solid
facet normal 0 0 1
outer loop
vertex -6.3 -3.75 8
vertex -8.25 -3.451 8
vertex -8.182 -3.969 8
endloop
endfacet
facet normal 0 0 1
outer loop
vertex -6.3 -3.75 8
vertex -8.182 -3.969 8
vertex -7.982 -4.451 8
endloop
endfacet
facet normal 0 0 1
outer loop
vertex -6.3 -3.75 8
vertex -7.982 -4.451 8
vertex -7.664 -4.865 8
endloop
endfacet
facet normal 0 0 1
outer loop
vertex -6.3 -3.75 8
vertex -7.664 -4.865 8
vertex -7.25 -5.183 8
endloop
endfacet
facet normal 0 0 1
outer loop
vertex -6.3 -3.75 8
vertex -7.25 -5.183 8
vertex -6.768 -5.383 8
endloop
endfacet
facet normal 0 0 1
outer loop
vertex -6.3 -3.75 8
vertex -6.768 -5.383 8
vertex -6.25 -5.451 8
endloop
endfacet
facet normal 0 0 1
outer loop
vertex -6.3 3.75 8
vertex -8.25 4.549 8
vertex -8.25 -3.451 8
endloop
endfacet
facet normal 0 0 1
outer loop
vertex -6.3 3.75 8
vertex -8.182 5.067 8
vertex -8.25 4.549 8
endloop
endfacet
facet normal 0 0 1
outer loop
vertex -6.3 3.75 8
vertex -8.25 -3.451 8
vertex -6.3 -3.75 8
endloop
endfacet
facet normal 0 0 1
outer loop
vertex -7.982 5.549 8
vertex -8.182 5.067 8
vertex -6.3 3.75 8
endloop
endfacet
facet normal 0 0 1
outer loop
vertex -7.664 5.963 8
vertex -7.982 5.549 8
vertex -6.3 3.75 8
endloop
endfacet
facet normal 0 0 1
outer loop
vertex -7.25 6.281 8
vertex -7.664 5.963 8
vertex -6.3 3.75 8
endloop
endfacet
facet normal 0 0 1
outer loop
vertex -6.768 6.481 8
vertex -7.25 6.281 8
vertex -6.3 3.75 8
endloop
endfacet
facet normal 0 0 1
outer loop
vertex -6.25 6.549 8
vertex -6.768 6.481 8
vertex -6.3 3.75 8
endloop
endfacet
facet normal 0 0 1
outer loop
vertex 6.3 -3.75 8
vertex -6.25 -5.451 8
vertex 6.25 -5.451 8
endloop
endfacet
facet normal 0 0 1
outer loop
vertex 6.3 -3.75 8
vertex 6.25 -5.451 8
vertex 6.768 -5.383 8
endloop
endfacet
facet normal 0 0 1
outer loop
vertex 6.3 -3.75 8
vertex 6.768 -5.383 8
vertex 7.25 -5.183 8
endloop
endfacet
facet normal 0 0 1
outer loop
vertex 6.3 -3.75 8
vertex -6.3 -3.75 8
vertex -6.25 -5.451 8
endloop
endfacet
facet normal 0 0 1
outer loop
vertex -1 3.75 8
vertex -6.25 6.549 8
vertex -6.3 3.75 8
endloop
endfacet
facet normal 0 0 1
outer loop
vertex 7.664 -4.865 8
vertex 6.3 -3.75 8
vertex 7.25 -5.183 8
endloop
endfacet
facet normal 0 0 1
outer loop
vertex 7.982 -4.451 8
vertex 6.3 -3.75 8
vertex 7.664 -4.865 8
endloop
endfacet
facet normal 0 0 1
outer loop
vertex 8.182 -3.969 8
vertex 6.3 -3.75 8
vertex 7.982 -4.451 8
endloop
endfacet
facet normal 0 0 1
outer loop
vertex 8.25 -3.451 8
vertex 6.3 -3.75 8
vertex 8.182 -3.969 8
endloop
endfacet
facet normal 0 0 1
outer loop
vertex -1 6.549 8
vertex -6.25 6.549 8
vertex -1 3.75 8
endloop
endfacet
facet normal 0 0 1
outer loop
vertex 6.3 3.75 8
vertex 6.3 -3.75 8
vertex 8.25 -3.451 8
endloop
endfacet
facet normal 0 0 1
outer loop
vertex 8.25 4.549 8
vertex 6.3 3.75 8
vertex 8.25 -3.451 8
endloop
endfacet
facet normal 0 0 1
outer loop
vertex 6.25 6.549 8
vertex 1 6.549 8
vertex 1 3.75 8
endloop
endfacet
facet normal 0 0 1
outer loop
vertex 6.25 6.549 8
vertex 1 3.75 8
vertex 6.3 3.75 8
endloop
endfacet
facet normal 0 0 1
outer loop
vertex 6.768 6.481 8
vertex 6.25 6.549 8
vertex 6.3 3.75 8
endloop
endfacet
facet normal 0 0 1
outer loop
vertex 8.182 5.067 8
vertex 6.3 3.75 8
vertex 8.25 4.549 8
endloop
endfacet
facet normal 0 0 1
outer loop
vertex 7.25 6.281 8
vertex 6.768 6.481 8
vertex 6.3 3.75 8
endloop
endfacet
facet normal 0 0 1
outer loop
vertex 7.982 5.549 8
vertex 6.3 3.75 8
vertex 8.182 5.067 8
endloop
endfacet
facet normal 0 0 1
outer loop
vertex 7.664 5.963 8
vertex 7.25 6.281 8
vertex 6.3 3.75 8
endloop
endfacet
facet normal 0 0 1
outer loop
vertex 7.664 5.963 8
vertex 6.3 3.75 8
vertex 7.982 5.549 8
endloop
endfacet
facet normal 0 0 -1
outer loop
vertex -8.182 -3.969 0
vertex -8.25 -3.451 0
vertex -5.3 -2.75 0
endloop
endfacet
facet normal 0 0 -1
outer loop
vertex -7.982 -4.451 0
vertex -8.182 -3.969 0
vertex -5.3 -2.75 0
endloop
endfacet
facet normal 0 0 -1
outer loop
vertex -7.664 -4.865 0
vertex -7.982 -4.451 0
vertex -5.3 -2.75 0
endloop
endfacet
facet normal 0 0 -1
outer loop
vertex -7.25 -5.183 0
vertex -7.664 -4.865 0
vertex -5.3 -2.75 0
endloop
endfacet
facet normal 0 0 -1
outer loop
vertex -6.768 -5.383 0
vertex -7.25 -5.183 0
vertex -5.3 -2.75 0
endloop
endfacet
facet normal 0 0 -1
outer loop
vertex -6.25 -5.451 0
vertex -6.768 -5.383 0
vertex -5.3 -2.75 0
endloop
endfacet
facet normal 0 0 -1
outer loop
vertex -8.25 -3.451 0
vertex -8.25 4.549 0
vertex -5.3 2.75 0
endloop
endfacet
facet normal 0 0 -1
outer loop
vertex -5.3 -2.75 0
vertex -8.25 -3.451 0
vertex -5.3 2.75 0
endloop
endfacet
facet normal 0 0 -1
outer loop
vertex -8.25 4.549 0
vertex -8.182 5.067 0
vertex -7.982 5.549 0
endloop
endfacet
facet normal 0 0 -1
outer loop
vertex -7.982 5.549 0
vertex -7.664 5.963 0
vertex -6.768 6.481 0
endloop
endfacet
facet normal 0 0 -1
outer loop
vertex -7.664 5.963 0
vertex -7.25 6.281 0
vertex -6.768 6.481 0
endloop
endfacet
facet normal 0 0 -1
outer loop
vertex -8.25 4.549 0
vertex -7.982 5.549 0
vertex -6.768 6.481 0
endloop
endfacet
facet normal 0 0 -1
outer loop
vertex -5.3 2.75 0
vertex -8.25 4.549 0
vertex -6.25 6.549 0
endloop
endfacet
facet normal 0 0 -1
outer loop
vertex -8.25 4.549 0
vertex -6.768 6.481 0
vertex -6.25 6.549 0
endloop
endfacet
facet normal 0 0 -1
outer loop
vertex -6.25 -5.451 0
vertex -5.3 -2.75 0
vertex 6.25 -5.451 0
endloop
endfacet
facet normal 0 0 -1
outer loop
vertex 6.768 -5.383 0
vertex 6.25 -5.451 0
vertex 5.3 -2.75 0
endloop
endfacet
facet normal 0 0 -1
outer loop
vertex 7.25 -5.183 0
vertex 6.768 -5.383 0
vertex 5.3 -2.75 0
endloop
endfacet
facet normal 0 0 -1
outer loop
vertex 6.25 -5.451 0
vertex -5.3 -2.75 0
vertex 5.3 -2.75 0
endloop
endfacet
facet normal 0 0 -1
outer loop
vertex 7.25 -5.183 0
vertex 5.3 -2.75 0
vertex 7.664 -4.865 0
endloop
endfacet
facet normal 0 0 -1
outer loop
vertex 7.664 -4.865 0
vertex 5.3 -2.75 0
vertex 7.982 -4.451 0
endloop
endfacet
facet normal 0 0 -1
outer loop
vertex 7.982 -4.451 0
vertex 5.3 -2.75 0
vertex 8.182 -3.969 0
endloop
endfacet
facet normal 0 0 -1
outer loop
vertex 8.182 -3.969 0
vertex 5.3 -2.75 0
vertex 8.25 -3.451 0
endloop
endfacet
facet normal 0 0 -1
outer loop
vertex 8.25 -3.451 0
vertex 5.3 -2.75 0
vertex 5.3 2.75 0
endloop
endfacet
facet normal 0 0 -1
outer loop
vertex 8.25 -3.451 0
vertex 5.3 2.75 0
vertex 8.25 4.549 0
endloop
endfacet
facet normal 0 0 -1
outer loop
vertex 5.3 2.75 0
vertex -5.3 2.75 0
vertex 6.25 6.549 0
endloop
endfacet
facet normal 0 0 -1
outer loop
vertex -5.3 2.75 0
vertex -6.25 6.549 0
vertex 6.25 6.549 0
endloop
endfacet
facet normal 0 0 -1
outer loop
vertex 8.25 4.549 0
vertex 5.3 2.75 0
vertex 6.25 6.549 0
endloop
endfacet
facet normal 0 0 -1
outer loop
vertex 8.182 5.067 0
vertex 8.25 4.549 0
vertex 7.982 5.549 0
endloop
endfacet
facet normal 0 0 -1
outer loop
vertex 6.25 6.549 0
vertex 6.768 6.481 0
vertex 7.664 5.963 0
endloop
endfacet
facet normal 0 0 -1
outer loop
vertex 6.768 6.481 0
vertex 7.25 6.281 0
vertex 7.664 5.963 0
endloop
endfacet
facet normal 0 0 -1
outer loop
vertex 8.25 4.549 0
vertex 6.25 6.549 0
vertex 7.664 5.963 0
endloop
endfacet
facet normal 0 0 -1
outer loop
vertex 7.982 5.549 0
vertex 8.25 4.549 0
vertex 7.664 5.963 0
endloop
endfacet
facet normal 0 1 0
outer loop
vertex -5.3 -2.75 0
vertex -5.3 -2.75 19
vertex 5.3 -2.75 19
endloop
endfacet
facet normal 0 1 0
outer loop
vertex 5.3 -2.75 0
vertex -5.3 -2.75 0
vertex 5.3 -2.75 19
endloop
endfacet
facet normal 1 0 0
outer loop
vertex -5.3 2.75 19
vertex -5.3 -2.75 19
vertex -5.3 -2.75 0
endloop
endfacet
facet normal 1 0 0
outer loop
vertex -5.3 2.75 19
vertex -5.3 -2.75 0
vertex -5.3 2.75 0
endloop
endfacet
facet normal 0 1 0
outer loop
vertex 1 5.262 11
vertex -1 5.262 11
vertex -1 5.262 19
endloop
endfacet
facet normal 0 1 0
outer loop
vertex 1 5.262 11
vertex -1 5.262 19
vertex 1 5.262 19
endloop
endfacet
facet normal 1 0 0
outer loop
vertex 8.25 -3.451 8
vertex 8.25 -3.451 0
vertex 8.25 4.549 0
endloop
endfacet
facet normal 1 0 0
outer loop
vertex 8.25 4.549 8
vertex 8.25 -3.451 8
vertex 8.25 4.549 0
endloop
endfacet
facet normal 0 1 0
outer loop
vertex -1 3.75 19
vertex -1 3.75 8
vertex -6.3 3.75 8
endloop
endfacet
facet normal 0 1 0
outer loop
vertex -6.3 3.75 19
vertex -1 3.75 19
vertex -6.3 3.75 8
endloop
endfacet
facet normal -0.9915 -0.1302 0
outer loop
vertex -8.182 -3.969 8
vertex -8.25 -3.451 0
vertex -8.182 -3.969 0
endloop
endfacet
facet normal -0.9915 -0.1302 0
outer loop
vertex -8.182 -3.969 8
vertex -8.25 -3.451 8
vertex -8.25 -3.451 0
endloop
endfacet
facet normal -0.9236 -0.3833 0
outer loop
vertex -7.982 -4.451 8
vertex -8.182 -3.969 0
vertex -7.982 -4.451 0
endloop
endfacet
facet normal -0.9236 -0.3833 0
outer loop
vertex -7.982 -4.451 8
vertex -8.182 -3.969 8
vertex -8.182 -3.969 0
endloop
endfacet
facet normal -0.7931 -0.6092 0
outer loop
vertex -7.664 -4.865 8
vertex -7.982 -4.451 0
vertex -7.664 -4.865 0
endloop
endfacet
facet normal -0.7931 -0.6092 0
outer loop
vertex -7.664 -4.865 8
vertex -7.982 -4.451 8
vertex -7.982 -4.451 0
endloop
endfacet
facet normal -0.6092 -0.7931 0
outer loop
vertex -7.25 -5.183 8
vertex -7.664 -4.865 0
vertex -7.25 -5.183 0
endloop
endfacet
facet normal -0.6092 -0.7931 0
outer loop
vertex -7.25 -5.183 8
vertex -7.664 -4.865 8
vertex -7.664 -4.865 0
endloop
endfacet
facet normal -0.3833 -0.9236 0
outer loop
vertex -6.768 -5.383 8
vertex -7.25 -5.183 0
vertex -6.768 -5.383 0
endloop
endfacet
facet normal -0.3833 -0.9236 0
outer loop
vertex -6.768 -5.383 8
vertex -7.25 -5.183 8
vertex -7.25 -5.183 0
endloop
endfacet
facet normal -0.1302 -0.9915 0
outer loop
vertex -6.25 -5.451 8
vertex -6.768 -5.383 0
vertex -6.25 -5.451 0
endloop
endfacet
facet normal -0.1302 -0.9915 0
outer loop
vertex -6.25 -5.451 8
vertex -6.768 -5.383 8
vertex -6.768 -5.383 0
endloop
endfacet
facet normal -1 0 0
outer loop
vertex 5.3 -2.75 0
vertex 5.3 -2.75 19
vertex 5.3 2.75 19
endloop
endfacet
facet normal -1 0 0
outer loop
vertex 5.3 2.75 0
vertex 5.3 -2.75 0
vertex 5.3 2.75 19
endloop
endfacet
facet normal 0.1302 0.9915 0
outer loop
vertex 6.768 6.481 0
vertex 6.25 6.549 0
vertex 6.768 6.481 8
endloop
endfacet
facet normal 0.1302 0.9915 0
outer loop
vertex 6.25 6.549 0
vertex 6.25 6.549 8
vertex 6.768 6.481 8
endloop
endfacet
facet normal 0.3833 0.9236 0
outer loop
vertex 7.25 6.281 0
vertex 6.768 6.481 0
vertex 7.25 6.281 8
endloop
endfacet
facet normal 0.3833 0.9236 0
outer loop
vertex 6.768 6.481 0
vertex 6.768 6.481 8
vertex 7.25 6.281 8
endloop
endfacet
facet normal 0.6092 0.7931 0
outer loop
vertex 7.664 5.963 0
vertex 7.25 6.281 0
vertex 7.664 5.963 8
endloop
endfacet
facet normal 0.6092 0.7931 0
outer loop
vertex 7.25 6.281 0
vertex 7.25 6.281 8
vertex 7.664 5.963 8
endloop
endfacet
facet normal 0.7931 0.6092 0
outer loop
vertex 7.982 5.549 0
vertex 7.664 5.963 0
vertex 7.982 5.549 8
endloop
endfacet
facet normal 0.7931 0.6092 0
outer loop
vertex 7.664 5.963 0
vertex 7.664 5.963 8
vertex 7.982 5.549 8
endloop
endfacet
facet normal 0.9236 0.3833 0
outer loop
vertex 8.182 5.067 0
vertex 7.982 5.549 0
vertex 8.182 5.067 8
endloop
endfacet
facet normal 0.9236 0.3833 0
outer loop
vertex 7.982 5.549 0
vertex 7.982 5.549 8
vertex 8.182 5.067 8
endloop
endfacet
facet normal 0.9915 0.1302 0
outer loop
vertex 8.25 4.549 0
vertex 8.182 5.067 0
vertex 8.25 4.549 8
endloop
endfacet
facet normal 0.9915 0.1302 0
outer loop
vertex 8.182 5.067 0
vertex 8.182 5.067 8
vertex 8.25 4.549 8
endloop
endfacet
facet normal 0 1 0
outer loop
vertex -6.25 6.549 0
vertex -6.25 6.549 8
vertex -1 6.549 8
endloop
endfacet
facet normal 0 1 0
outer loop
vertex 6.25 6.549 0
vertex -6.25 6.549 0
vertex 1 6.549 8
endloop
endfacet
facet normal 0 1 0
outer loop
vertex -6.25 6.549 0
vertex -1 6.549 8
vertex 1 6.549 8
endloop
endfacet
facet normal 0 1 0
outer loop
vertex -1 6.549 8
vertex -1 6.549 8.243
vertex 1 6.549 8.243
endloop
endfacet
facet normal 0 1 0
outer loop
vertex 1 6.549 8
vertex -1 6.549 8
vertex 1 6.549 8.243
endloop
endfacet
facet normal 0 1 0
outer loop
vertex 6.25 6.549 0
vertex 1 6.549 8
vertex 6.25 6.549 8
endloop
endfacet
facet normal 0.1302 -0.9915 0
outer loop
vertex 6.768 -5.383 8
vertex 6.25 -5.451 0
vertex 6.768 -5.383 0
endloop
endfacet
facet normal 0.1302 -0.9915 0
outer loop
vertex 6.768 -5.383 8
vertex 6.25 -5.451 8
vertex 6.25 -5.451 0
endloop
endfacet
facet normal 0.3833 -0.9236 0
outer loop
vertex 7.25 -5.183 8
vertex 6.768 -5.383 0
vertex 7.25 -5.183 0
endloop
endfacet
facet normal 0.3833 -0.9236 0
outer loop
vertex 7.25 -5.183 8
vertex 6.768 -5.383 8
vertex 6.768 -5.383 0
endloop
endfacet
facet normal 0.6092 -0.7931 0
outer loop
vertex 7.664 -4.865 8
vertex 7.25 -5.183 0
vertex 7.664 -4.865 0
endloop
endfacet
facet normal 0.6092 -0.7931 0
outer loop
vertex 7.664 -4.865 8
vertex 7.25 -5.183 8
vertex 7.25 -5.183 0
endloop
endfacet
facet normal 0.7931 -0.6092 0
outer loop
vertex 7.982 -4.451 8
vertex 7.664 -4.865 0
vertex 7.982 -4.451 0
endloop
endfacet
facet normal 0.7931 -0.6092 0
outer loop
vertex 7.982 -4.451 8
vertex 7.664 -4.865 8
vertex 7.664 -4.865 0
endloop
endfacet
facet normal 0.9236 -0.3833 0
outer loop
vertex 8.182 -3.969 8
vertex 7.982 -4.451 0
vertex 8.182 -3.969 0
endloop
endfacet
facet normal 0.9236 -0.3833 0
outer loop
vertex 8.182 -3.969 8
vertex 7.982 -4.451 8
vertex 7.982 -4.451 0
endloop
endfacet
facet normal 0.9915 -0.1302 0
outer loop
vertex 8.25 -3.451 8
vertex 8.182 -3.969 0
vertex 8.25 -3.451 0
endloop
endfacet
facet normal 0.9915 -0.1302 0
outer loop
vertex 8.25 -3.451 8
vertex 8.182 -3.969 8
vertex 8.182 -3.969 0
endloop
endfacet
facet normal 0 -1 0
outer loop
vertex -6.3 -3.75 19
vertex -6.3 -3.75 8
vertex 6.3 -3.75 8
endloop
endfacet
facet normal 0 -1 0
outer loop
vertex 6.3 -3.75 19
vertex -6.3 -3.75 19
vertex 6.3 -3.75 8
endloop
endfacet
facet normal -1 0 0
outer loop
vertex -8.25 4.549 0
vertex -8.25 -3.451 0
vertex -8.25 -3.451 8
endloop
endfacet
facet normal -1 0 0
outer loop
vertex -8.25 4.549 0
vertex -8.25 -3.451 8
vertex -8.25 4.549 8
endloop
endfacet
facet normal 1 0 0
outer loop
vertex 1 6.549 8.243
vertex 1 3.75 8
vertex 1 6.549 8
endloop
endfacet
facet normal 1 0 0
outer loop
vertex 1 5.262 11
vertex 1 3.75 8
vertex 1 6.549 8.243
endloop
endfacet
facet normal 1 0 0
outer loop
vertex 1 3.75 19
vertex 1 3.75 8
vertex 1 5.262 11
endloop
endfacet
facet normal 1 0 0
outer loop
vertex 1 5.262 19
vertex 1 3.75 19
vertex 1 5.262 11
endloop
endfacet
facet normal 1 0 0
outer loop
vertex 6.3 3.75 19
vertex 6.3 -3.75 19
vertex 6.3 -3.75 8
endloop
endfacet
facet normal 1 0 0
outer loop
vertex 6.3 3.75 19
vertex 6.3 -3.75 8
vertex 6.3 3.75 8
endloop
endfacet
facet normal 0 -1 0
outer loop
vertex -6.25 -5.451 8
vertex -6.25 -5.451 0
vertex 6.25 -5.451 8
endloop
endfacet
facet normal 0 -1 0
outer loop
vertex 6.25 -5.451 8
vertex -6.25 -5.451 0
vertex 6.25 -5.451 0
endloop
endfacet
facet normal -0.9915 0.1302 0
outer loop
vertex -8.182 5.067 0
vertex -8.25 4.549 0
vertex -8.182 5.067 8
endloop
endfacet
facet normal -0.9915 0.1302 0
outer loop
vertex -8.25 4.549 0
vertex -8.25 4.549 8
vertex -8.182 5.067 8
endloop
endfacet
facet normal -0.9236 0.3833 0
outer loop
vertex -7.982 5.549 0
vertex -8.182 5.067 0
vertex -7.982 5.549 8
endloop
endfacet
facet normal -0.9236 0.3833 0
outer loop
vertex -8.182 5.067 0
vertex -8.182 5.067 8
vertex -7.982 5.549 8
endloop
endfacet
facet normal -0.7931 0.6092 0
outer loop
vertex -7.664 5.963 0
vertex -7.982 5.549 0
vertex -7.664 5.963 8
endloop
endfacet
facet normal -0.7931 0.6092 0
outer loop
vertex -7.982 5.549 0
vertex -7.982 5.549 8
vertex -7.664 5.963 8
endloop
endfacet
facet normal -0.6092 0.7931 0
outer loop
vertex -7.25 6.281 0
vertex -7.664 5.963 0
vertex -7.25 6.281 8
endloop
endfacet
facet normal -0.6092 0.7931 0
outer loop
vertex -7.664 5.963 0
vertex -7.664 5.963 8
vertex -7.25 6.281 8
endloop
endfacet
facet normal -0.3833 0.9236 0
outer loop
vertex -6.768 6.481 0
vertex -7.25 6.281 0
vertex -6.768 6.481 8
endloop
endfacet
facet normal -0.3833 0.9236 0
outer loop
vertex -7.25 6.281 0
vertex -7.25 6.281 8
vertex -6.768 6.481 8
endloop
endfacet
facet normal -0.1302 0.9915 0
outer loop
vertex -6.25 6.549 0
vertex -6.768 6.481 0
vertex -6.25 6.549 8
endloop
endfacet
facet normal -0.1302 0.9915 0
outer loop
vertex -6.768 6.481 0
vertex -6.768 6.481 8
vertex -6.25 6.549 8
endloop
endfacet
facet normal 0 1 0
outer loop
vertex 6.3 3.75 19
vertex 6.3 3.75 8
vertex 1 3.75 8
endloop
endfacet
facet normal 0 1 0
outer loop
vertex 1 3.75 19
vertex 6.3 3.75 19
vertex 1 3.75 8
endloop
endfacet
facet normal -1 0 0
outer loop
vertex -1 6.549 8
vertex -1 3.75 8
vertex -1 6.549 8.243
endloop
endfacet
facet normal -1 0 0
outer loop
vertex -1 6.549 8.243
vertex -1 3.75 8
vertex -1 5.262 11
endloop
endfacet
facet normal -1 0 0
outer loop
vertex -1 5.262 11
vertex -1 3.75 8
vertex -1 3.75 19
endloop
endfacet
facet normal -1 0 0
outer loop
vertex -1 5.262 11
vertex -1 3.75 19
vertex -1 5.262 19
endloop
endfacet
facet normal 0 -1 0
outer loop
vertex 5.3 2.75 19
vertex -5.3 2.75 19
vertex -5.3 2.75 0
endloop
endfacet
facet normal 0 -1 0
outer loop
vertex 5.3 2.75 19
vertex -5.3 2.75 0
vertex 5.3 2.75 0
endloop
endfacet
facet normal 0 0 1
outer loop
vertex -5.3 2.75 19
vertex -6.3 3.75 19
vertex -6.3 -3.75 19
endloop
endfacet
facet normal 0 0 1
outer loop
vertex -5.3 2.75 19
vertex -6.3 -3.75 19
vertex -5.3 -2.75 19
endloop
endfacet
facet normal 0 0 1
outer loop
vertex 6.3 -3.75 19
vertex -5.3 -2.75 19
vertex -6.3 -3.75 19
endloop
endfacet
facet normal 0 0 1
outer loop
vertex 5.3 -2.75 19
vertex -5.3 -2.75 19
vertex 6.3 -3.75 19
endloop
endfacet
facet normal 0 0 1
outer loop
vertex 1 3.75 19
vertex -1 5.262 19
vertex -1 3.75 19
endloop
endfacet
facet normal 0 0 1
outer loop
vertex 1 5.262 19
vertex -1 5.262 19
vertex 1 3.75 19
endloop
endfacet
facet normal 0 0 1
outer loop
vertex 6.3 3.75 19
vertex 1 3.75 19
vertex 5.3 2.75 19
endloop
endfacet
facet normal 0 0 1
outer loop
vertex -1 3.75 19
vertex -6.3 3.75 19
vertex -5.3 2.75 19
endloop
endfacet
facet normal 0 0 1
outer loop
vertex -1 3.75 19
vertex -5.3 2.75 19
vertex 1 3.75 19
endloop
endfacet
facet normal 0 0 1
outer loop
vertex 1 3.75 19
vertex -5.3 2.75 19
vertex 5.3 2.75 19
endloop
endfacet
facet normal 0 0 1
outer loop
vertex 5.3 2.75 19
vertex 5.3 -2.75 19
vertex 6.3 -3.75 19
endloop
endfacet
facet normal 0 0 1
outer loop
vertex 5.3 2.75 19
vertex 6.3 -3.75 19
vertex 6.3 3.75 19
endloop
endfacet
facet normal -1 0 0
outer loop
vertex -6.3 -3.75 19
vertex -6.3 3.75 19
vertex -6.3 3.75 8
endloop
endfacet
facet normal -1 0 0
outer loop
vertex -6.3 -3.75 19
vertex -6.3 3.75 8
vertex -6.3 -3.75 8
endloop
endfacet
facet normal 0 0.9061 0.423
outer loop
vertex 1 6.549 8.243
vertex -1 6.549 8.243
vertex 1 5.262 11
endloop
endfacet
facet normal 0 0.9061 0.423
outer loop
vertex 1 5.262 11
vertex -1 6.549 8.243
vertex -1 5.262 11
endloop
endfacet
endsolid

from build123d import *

# Parameters (mm, degrees)
F0_W        = 10.6
F0_H        = 5.5
F0_W_2      = 2
F0_H_2      = 1.512365222
F1_DEPTH    = 19
F0_W_3      = 16.5
F0_H_3      = 12
F2_DEPTH    = 8
F3_R        = 2
F4_T4_DEPTH = 2


# Not quite as in the source:
# - a fillet or chamfer that OpenCascade refuses, or shapes differently, is made with other operations: its cross-section is extruded or revolved along the edge and cut away or added


with BuildPart() as f1:
    # F0 (on Top) → F1 (new body)
    with BuildSketch(Plane.XY):
        Polygon((-6.3, -3.75), (6.3, -3.75), (6.3, 3.75), (1, 3.75), (-1, 3.75), (-6.3, 3.75), align=None)
        Rectangle(F0_W, F0_H, mode=Mode.SUBTRACT)
        with Locations((0, 4.506182611)):
            Rectangle(F0_W_2, F0_H_2)
    extrude(amount=F1_DEPTH)

    # F0 (on Top) → F2 (join)
    with BuildSketch(Plane.XY):
        with Locations((0, 0.5489425384)):
            Rectangle(F0_W_3, F0_H_3)
        Polygon((6.3, 3.75), (6.3, -3.75), (-6.3, -3.75), (-6.3, 3.75), (-1, 3.75), (-1, 5.262365222), (1, 5.262365222), (1, 3.75), align=None, mode=Mode.SUBTRACT)
    extrude(amount=F2_DEPTH)

    # F3
    f3_edges = [f1.edges().sort_by_distance(p)[0] for p in [
        (-8.25, -5.451057, 4),
        (8.25, -5.451057, 4),
        (8.25, 6.548943, 4),
        (-8.25, 6.548943, 4),
    ]]
    fillet(f3_edges, radius=F3_R)

    # F4: chamfer of 3 x 1.4 on 1 edges, made by hand


with BuildPart() as f4_tool2:
    # F4_s3 → F4_t4 (new body)
    with BuildSketch(Plane.YZ.offset(-1)):
        Polygon((6.662365222, 8), (5.262365222, 11), (5.262365222, 8), align=None)
    extrude(amount=F4_T4_DEPTH)

    split(bisect_by=Plane.XZ.offset(-6.5489425384), keep=Keep.TOP)


with BuildPart() as f1_1:
    add(f1.part)

    # F4_t1: union F4_tool2
    add(f4_tool2.part)


solid = f1_1.part
